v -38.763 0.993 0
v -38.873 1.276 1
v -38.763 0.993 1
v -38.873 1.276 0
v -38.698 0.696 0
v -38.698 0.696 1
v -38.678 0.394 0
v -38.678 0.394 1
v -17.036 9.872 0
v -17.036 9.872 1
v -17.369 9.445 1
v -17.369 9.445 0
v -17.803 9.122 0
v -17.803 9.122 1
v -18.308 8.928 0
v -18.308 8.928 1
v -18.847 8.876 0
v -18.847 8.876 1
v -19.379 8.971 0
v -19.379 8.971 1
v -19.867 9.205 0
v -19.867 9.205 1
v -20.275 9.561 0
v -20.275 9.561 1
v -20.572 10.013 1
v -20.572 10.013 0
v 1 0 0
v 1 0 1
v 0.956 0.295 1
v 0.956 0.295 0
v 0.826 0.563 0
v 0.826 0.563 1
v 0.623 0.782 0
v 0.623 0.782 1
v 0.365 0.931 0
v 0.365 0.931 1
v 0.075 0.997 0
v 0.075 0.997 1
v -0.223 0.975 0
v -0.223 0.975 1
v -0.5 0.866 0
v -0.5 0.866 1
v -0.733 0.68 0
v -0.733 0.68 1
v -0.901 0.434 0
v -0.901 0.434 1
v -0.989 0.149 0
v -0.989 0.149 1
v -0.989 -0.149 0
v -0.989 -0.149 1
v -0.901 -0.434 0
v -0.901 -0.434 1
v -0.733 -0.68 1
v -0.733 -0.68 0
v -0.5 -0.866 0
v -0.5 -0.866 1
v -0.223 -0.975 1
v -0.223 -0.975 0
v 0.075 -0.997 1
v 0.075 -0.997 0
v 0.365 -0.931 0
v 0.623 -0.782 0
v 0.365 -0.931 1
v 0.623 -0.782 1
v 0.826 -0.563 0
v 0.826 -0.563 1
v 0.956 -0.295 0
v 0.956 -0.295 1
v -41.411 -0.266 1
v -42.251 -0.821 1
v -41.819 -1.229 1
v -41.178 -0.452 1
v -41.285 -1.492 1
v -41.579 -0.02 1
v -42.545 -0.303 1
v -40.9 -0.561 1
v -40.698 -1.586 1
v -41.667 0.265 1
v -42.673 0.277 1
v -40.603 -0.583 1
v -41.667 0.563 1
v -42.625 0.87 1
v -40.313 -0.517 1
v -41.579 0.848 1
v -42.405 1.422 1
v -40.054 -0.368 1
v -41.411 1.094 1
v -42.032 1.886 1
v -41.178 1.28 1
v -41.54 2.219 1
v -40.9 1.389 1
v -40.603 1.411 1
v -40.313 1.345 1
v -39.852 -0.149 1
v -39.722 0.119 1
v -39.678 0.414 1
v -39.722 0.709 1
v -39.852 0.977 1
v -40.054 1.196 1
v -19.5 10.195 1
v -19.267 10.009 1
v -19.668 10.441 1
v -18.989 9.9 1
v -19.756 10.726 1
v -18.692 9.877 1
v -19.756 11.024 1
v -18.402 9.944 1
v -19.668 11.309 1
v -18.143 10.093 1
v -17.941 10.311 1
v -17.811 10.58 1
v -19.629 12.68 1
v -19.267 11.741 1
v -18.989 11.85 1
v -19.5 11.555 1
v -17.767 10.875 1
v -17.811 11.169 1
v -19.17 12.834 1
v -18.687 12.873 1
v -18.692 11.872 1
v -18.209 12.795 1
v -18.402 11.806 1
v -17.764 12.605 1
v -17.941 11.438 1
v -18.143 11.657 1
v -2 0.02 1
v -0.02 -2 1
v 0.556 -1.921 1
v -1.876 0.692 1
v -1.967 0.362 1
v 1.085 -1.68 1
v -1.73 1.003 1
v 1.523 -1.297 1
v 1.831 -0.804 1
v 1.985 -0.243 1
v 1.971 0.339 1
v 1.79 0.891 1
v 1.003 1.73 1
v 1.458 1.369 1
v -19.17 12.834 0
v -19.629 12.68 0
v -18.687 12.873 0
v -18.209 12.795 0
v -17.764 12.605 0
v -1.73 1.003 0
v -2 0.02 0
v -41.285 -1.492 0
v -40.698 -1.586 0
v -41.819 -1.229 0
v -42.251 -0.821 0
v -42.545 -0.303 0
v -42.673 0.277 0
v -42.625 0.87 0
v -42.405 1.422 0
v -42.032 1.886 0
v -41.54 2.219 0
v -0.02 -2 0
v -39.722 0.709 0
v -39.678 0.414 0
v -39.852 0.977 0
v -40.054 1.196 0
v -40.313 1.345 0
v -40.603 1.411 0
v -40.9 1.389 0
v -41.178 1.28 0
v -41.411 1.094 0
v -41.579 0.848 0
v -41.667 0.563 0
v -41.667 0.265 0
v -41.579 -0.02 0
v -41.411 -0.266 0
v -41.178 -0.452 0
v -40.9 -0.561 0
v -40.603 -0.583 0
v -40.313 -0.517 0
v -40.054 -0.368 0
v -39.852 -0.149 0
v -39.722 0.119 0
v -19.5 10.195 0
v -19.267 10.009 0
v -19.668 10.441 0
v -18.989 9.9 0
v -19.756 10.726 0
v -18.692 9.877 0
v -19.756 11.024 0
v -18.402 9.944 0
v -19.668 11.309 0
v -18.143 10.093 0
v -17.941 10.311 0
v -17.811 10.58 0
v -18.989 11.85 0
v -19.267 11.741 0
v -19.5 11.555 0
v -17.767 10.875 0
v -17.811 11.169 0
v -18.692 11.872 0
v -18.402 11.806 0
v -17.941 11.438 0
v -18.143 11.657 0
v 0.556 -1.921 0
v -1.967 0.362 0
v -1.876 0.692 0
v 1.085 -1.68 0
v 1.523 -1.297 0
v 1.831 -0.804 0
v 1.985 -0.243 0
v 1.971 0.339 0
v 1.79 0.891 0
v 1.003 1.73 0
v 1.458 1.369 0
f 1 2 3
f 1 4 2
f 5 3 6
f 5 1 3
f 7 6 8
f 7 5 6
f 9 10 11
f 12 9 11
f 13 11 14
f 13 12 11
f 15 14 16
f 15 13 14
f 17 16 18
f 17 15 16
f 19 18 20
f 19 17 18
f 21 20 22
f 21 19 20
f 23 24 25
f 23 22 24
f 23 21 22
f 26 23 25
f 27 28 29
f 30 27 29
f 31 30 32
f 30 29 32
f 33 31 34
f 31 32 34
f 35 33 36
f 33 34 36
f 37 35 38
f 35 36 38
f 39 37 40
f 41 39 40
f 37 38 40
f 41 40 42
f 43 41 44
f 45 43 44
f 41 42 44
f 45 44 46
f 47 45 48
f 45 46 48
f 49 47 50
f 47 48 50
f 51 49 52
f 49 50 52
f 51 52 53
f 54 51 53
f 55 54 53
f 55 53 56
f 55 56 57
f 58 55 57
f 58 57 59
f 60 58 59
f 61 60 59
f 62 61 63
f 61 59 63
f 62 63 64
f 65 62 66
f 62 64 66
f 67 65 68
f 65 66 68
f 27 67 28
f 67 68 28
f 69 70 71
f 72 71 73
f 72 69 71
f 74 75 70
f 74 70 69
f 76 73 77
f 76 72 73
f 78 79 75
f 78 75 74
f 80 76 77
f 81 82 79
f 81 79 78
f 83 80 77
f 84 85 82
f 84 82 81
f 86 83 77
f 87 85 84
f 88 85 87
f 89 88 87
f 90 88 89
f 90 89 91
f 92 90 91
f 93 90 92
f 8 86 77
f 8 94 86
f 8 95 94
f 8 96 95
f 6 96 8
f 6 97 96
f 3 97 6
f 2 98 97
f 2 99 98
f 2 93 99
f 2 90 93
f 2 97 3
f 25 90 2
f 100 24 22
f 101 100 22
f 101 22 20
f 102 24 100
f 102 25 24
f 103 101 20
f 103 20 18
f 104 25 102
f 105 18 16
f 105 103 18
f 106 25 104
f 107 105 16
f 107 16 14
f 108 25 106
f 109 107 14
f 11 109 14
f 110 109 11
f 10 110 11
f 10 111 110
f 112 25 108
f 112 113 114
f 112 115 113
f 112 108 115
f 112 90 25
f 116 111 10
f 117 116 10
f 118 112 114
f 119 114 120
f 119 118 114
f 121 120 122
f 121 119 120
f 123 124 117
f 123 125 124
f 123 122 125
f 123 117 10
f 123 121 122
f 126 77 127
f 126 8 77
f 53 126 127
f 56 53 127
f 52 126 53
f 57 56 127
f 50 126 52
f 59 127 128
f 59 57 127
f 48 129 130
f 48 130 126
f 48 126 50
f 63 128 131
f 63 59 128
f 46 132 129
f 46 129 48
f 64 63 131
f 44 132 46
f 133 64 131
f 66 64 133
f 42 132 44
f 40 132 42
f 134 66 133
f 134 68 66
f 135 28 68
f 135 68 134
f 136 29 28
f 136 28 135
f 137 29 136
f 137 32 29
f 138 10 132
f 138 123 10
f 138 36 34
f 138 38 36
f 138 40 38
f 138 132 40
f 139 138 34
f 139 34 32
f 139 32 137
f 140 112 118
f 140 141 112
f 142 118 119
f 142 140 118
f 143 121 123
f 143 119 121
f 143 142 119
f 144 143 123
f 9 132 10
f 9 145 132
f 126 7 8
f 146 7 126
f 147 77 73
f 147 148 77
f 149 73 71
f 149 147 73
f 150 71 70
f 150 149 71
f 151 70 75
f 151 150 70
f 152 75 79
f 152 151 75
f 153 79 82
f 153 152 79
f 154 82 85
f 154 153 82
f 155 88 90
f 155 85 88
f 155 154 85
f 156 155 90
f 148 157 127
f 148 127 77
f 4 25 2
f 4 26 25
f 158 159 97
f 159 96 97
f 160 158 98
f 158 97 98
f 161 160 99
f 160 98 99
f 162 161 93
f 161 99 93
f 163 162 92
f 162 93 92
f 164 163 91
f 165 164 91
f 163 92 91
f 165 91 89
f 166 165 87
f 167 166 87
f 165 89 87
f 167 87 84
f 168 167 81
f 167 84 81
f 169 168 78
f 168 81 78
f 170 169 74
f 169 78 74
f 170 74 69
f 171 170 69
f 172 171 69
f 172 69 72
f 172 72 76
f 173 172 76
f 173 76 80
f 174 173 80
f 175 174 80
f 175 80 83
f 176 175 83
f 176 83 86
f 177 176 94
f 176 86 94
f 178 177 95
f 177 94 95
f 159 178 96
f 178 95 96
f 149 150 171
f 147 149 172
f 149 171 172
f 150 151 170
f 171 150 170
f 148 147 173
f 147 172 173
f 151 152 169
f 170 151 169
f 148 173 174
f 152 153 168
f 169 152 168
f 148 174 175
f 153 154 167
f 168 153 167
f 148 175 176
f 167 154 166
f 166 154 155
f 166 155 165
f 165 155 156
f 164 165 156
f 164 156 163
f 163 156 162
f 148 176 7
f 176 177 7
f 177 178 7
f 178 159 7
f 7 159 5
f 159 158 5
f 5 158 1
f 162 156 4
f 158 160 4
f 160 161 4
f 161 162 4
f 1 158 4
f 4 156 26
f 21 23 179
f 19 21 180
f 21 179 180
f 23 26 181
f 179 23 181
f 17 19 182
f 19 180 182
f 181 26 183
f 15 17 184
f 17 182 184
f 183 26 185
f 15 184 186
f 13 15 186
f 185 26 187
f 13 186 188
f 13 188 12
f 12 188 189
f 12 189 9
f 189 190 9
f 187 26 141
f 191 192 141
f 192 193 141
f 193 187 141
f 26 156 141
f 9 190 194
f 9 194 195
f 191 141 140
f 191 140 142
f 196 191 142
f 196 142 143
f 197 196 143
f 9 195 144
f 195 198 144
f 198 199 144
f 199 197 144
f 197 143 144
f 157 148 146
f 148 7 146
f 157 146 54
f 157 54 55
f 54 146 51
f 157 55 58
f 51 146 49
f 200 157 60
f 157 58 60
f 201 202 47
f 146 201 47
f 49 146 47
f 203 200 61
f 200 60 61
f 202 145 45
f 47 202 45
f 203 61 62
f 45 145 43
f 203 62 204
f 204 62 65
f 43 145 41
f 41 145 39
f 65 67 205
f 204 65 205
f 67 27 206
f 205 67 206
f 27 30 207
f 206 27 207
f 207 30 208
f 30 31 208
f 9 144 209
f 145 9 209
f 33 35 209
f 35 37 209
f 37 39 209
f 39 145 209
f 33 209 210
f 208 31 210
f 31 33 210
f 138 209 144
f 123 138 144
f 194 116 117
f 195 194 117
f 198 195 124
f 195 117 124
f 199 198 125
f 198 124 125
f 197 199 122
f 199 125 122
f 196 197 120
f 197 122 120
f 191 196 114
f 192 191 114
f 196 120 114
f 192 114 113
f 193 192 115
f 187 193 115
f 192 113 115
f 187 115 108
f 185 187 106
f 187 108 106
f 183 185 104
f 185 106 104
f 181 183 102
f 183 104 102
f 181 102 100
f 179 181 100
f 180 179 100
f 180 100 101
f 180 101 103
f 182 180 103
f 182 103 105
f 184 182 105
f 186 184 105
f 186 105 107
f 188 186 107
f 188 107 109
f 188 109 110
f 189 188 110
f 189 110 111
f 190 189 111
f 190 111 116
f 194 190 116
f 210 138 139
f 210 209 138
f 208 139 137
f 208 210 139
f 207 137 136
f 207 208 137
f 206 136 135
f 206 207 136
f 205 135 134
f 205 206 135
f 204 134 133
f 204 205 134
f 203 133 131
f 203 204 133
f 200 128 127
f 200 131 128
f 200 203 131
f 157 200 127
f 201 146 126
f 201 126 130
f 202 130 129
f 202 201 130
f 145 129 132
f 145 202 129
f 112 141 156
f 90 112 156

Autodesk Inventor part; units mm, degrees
ref_plane "YZ Plane" through (0, 0, 0) normal (1, 0, 0) x (0, 1, 0)
ref_plane "XZ Plane" through (0, 0, 0) normal (0, 1, 0) x (-1, 0, 0)
ref_plane "XY Plane" through (0, 0, 0) normal (0, 0, 1) x (1, 0, 0)
sketch "草圖1" plane through (0, 0, 0) normal (0, 0, 1) x (1, 0, 0)
  line L0 (-1.7305, 1.0027) -> (-17.0365, 9.8719)
  line L1 (-18.7669, 10.8747) -> (-38.873, 1.2756)
  line L2 (-40.6779, 0.4139) -> (-1.9999, 0.0203)
  line L3 (8.4583, -2.0862) -> (-44.617, -1.5461)
  line L4 (-19.6286, 12.6795) -> (-43.3233, 1.3672)
  line L5 (7.8765, -2.2526) -> (-17.7642, 12.6051)
  arc A0 (-17.7642, 12.6051) -> (-19.6286, 12.6795) centre (-18.7669, 10.8747) ccw
  arc A1 (-20.5718, 10.013) -> (-17.0365, 9.8719) centre (-18.7669, 10.8747) ccw
  arc A2 (-1.7305, 1.0027) -> (-1.9999, 0.0203) centre (0, 0) ccw
  arc A3 (-0.0203, -1.9999) -> (1.0027, 1.7305) centre (0, 0) ccw
  arc A4 (-41.5396, 2.2188) -> (-40.6982, -1.586) centre (-40.6779, 0.4139) ccw
  arc A5 (-38.678, 0.3936) -> (-38.873, 1.2756) centre (-40.6779, 0.4139) ccw
  dimension "d0" = 21.69
  dimension "d1" = 24.28
  dimension "d2" = 40.68
extrude "擠出1" add sketch "草圖1" along normal blind 1 contours L3 A4 L4 A0 L5 A3
sketch "草圖2" plane through (0, 0, 1) normal (0, 0, 1) x (1, 0, 0)
  arc A0 (-20.5718, 10.013) -> (-17.0365, 9.8719) centre (-18.7669, 10.8747) ccw projected
  circle A1 centre (-18.7669, 10.8747) radius 1
  circle A2 centre (0, 0) radius 1
  arc A3 (-38.678, 0.3936) -> (-38.873, 1.2756) centre (-40.6779, 0.4139) ccw projected
  circle A4 centre (-40.6779, 0.4139) radius 1
  dimension "d8" = 2
  dimension "d9" = 2
  dimension "d10" = 2
extrude "擠出2" cut sketch "草圖2" against normal blind 10
properties part number "三角塊2"
